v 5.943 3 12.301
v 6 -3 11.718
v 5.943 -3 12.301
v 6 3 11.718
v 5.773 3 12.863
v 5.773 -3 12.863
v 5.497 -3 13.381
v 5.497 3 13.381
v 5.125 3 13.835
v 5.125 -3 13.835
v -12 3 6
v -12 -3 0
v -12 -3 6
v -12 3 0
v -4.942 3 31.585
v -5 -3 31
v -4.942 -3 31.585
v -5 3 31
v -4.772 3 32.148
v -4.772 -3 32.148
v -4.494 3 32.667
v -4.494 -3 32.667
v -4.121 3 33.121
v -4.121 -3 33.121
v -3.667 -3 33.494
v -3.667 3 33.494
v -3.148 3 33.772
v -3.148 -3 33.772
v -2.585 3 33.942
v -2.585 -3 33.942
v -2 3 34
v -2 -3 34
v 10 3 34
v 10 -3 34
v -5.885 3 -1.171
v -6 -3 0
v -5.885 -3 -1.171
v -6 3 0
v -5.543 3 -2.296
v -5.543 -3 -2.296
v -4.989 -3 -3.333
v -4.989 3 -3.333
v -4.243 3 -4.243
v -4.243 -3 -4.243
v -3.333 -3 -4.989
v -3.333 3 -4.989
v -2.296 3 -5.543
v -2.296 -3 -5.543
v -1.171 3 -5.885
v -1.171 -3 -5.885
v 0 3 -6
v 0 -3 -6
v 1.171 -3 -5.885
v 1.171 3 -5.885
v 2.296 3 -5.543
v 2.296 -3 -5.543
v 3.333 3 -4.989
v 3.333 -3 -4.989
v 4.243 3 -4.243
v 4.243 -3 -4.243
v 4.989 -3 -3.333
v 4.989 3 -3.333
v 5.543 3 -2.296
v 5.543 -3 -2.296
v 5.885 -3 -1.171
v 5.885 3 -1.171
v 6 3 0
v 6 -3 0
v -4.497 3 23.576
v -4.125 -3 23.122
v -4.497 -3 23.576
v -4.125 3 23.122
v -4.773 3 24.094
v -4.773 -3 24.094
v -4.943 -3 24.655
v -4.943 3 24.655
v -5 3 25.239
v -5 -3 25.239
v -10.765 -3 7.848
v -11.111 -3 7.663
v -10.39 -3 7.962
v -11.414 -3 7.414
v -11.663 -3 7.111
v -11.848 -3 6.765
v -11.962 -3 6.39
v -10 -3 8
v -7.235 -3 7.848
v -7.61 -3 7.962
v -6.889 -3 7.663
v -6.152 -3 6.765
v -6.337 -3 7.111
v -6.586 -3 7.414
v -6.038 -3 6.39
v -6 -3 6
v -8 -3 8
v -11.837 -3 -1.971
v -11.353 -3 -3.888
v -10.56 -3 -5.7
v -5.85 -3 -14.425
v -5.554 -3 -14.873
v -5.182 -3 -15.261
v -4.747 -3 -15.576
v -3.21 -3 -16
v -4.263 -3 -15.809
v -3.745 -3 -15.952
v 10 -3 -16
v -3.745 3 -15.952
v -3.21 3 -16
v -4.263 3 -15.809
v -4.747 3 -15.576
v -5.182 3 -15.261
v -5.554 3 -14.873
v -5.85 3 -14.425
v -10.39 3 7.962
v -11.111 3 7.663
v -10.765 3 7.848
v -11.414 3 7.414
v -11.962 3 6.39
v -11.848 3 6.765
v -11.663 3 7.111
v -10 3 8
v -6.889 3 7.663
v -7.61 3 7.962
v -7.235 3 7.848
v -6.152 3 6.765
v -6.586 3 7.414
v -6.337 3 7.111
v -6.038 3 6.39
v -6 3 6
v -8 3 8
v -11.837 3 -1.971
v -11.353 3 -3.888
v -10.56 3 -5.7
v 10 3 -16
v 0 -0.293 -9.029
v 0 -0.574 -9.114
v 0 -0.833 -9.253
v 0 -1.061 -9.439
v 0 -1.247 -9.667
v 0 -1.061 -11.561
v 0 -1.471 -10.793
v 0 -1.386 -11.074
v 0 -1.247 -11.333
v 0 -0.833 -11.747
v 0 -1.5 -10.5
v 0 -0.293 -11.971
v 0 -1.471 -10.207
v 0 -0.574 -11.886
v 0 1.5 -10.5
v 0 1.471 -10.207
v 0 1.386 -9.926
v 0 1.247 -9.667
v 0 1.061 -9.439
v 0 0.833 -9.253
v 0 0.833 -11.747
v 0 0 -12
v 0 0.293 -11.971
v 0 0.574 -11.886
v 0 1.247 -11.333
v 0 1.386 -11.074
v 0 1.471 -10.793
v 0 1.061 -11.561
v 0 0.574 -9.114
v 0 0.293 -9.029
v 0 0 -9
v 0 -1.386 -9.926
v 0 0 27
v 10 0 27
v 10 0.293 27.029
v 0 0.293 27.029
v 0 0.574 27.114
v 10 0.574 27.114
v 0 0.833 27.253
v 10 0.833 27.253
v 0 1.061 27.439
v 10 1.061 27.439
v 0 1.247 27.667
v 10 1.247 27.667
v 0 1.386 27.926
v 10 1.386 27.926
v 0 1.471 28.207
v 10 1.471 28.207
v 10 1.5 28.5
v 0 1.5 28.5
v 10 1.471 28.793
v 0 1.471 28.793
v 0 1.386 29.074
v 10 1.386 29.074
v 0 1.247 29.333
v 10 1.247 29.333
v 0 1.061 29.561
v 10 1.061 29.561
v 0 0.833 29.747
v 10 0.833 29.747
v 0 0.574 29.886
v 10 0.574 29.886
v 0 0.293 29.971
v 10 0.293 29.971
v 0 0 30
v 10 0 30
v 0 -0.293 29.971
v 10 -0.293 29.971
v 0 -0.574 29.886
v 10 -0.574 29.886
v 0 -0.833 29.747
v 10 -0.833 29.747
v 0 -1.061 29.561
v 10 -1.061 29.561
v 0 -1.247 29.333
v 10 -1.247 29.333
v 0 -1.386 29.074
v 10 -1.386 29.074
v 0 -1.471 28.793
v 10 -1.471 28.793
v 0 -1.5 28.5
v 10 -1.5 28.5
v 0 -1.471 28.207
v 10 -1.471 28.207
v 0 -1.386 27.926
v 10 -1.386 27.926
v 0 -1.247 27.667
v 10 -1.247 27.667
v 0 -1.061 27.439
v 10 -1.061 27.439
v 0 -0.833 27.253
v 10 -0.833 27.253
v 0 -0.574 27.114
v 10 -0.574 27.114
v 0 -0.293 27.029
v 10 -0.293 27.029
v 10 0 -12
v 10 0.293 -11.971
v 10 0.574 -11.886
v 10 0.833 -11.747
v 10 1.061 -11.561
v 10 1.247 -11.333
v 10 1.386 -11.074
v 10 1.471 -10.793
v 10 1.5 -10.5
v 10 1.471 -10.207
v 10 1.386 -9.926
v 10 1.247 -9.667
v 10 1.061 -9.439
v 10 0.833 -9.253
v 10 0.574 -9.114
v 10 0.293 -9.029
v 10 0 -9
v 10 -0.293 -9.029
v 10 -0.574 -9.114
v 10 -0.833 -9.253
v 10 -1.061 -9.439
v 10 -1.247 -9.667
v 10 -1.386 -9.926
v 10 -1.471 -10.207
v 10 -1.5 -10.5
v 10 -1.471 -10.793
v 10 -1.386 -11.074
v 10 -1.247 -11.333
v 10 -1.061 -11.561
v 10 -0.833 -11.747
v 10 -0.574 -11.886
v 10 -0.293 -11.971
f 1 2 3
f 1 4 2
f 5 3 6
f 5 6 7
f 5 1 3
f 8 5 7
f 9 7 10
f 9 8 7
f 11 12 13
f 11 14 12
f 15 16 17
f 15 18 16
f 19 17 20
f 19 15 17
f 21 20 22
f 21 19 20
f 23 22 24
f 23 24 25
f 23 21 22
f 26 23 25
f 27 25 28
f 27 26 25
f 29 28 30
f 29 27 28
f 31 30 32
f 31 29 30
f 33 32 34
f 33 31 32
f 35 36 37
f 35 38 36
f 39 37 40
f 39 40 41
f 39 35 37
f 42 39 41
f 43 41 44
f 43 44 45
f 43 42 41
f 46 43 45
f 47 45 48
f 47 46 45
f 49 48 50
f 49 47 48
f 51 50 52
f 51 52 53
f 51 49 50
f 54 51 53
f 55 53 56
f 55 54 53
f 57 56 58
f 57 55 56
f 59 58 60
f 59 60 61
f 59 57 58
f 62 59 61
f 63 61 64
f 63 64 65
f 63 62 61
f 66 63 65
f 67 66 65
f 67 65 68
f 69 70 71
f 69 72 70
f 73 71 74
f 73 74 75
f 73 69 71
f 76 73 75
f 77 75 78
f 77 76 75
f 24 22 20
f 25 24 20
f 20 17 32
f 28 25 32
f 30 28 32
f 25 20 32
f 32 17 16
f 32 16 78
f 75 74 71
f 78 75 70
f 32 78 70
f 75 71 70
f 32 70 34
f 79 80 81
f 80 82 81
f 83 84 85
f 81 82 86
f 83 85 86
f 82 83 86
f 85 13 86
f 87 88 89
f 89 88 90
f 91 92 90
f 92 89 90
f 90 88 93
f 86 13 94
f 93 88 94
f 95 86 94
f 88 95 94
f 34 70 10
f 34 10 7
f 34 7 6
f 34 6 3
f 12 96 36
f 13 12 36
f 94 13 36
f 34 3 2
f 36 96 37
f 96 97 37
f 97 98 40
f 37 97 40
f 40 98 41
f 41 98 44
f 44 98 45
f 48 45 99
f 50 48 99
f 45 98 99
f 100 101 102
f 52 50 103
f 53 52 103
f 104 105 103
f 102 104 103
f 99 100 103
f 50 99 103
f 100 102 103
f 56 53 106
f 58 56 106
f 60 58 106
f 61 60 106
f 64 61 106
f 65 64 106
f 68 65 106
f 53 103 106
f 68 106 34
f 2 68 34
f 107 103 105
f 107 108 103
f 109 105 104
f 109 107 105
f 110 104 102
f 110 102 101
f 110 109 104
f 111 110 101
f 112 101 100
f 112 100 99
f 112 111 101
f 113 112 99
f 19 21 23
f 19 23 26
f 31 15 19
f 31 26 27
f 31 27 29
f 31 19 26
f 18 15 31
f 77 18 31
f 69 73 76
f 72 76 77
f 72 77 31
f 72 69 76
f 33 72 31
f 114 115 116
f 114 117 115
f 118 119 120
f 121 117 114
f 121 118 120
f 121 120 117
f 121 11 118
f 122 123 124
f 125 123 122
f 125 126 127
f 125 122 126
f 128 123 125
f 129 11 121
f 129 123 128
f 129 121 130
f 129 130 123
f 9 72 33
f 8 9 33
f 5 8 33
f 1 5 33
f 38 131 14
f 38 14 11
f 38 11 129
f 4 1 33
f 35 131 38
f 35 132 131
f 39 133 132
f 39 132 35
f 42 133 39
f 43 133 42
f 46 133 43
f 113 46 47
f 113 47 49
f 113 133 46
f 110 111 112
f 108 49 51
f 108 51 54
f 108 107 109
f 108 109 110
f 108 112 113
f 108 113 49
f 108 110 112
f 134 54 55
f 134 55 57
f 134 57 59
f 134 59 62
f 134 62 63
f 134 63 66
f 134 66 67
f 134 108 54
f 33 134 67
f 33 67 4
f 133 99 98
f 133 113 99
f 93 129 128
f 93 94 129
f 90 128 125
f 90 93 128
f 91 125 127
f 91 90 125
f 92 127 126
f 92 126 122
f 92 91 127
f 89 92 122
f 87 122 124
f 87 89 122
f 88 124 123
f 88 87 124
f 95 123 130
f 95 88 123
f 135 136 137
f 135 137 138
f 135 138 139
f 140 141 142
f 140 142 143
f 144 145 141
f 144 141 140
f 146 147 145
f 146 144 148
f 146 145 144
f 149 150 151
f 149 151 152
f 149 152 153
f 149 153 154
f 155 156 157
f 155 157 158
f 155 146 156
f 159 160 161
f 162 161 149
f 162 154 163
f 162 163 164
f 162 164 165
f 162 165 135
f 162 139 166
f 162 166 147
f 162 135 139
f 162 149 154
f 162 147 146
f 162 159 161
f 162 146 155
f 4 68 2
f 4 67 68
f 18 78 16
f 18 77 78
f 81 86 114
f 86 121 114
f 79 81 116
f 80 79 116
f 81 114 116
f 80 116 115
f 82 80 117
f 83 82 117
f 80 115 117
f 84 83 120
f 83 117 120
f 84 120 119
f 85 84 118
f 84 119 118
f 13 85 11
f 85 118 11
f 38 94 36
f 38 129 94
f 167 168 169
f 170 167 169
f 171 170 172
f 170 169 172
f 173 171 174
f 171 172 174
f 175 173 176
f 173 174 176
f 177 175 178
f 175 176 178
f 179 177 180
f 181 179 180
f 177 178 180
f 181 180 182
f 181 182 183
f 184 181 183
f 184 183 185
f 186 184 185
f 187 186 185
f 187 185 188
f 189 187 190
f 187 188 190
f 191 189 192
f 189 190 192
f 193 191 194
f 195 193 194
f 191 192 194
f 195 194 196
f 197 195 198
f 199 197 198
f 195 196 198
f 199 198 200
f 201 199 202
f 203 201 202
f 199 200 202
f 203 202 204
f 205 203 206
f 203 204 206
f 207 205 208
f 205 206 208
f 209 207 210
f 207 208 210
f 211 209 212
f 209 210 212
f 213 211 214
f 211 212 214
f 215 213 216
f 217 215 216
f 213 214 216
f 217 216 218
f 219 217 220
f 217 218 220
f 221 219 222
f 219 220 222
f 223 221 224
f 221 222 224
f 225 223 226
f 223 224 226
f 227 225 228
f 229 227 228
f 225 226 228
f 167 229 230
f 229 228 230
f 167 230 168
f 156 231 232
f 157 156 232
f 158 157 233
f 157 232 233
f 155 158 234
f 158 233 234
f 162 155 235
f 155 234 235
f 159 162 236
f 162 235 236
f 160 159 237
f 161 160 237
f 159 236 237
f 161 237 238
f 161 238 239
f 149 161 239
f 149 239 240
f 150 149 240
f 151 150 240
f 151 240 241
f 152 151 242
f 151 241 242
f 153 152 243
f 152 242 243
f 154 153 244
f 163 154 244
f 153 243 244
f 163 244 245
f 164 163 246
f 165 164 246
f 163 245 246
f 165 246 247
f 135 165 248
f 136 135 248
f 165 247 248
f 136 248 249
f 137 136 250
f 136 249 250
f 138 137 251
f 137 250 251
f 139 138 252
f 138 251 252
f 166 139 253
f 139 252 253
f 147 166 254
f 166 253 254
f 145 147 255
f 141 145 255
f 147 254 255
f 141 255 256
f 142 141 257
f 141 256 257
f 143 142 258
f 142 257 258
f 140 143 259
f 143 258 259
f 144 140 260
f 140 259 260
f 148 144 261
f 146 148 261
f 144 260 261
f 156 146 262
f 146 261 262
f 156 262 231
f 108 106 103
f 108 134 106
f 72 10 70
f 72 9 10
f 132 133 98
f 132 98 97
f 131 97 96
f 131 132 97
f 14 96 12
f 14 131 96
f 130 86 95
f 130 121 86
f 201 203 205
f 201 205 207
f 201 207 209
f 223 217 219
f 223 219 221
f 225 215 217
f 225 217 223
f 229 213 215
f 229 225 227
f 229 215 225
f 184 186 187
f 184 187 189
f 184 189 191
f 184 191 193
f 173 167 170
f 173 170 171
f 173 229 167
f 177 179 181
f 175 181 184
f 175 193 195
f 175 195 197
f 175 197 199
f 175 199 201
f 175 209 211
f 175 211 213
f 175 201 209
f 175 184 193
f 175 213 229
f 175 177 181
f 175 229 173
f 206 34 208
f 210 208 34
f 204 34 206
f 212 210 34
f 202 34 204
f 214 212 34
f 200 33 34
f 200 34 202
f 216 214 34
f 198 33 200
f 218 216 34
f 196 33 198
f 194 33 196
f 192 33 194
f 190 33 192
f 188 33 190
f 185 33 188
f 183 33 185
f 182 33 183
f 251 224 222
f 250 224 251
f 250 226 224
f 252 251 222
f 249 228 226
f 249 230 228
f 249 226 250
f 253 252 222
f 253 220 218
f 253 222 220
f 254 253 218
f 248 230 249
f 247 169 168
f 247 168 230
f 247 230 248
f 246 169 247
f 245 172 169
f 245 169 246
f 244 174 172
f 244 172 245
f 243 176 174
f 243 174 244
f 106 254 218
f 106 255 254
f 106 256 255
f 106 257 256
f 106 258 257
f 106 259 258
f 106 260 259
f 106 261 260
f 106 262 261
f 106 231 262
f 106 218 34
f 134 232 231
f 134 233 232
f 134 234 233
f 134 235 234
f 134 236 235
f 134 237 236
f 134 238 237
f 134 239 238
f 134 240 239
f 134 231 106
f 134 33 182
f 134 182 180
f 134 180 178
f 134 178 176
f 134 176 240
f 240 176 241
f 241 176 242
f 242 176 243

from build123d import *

# Parameters (mm, degrees)
BOSS_EXTRUDE1_DEPTH = 3
SKETCH2_R           = 1.5
CUT_EXTRUDE1_DEPTH  = 10
FILLET1_R           = 3
FILLET2_R           = 2


with BuildPart() as part:
    # Sketch1 → Boss-Extrude1 (new, symmetric)
    with BuildSketch(Plane(origin=(0, 0, 0), x_dir=(1, 0, 0), z_dir=(0, 1, 0))):
        with BuildLine():
            Line((6, 0), (6, -12.956788481))
            Line((6, -12.956788481), (-5, -24))
            Line((-5, -24), (-5, -34))
            Line((-5, -34), (10, -34))
            Line((10, -34), (10, 16))
            Line((10, 16), (-5, 16))
            Line((-5, 16), (-10.559794957, 5.700064076))
            ThreePointArc((-10.559794957, 5.700064076), (-11.634378786, 2.939596955), (-12, 0))
            Line((-12, 0), (-12, -8))
            Line((-12, -8), (-6, -8))
            Line((-6, -8), (-6, 0))
            ThreePointArc((-6, 0), (0, 6), (6, 0))
        make_face()
    extrude(amount=BOSS_EXTRUDE1_DEPTH, both=True)

    # Sketch2 → Cut-Extrude1 (cut)
    with BuildSketch(Plane(origin=(10, 0, 0), x_dir=(0, 0, -1), z_dir=(1, 0, 0))):
        with Locations((-28.5, 0)):
            Circle(SKETCH2_R)
        with Locations((10.5, 0)):
            Circle(SKETCH2_R)
    extrude(amount=-CUT_EXTRUDE1_DEPTH, mode=Mode.SUBTRACT)

    # Fillet1
    fillet1_edges = [part.edges().sort_by_distance(p)[0] for p in [
        (-5, 0, -16),
        (-5, 0, 34),
        (-5, 0, 24),
        (6, 0, 12.956788481),
    ]]
    fillet(fillet1_edges, radius=FILLET1_R)

    # Fillet2
    fillet2_edges = [part.edges().sort_by_distance(p)[0] for p in [
        (-6, 0, 8),
        (-12, 0, 8),
    ]]
    fillet(fillet2_edges, radius=FILLET2_R)


solid = part.part
